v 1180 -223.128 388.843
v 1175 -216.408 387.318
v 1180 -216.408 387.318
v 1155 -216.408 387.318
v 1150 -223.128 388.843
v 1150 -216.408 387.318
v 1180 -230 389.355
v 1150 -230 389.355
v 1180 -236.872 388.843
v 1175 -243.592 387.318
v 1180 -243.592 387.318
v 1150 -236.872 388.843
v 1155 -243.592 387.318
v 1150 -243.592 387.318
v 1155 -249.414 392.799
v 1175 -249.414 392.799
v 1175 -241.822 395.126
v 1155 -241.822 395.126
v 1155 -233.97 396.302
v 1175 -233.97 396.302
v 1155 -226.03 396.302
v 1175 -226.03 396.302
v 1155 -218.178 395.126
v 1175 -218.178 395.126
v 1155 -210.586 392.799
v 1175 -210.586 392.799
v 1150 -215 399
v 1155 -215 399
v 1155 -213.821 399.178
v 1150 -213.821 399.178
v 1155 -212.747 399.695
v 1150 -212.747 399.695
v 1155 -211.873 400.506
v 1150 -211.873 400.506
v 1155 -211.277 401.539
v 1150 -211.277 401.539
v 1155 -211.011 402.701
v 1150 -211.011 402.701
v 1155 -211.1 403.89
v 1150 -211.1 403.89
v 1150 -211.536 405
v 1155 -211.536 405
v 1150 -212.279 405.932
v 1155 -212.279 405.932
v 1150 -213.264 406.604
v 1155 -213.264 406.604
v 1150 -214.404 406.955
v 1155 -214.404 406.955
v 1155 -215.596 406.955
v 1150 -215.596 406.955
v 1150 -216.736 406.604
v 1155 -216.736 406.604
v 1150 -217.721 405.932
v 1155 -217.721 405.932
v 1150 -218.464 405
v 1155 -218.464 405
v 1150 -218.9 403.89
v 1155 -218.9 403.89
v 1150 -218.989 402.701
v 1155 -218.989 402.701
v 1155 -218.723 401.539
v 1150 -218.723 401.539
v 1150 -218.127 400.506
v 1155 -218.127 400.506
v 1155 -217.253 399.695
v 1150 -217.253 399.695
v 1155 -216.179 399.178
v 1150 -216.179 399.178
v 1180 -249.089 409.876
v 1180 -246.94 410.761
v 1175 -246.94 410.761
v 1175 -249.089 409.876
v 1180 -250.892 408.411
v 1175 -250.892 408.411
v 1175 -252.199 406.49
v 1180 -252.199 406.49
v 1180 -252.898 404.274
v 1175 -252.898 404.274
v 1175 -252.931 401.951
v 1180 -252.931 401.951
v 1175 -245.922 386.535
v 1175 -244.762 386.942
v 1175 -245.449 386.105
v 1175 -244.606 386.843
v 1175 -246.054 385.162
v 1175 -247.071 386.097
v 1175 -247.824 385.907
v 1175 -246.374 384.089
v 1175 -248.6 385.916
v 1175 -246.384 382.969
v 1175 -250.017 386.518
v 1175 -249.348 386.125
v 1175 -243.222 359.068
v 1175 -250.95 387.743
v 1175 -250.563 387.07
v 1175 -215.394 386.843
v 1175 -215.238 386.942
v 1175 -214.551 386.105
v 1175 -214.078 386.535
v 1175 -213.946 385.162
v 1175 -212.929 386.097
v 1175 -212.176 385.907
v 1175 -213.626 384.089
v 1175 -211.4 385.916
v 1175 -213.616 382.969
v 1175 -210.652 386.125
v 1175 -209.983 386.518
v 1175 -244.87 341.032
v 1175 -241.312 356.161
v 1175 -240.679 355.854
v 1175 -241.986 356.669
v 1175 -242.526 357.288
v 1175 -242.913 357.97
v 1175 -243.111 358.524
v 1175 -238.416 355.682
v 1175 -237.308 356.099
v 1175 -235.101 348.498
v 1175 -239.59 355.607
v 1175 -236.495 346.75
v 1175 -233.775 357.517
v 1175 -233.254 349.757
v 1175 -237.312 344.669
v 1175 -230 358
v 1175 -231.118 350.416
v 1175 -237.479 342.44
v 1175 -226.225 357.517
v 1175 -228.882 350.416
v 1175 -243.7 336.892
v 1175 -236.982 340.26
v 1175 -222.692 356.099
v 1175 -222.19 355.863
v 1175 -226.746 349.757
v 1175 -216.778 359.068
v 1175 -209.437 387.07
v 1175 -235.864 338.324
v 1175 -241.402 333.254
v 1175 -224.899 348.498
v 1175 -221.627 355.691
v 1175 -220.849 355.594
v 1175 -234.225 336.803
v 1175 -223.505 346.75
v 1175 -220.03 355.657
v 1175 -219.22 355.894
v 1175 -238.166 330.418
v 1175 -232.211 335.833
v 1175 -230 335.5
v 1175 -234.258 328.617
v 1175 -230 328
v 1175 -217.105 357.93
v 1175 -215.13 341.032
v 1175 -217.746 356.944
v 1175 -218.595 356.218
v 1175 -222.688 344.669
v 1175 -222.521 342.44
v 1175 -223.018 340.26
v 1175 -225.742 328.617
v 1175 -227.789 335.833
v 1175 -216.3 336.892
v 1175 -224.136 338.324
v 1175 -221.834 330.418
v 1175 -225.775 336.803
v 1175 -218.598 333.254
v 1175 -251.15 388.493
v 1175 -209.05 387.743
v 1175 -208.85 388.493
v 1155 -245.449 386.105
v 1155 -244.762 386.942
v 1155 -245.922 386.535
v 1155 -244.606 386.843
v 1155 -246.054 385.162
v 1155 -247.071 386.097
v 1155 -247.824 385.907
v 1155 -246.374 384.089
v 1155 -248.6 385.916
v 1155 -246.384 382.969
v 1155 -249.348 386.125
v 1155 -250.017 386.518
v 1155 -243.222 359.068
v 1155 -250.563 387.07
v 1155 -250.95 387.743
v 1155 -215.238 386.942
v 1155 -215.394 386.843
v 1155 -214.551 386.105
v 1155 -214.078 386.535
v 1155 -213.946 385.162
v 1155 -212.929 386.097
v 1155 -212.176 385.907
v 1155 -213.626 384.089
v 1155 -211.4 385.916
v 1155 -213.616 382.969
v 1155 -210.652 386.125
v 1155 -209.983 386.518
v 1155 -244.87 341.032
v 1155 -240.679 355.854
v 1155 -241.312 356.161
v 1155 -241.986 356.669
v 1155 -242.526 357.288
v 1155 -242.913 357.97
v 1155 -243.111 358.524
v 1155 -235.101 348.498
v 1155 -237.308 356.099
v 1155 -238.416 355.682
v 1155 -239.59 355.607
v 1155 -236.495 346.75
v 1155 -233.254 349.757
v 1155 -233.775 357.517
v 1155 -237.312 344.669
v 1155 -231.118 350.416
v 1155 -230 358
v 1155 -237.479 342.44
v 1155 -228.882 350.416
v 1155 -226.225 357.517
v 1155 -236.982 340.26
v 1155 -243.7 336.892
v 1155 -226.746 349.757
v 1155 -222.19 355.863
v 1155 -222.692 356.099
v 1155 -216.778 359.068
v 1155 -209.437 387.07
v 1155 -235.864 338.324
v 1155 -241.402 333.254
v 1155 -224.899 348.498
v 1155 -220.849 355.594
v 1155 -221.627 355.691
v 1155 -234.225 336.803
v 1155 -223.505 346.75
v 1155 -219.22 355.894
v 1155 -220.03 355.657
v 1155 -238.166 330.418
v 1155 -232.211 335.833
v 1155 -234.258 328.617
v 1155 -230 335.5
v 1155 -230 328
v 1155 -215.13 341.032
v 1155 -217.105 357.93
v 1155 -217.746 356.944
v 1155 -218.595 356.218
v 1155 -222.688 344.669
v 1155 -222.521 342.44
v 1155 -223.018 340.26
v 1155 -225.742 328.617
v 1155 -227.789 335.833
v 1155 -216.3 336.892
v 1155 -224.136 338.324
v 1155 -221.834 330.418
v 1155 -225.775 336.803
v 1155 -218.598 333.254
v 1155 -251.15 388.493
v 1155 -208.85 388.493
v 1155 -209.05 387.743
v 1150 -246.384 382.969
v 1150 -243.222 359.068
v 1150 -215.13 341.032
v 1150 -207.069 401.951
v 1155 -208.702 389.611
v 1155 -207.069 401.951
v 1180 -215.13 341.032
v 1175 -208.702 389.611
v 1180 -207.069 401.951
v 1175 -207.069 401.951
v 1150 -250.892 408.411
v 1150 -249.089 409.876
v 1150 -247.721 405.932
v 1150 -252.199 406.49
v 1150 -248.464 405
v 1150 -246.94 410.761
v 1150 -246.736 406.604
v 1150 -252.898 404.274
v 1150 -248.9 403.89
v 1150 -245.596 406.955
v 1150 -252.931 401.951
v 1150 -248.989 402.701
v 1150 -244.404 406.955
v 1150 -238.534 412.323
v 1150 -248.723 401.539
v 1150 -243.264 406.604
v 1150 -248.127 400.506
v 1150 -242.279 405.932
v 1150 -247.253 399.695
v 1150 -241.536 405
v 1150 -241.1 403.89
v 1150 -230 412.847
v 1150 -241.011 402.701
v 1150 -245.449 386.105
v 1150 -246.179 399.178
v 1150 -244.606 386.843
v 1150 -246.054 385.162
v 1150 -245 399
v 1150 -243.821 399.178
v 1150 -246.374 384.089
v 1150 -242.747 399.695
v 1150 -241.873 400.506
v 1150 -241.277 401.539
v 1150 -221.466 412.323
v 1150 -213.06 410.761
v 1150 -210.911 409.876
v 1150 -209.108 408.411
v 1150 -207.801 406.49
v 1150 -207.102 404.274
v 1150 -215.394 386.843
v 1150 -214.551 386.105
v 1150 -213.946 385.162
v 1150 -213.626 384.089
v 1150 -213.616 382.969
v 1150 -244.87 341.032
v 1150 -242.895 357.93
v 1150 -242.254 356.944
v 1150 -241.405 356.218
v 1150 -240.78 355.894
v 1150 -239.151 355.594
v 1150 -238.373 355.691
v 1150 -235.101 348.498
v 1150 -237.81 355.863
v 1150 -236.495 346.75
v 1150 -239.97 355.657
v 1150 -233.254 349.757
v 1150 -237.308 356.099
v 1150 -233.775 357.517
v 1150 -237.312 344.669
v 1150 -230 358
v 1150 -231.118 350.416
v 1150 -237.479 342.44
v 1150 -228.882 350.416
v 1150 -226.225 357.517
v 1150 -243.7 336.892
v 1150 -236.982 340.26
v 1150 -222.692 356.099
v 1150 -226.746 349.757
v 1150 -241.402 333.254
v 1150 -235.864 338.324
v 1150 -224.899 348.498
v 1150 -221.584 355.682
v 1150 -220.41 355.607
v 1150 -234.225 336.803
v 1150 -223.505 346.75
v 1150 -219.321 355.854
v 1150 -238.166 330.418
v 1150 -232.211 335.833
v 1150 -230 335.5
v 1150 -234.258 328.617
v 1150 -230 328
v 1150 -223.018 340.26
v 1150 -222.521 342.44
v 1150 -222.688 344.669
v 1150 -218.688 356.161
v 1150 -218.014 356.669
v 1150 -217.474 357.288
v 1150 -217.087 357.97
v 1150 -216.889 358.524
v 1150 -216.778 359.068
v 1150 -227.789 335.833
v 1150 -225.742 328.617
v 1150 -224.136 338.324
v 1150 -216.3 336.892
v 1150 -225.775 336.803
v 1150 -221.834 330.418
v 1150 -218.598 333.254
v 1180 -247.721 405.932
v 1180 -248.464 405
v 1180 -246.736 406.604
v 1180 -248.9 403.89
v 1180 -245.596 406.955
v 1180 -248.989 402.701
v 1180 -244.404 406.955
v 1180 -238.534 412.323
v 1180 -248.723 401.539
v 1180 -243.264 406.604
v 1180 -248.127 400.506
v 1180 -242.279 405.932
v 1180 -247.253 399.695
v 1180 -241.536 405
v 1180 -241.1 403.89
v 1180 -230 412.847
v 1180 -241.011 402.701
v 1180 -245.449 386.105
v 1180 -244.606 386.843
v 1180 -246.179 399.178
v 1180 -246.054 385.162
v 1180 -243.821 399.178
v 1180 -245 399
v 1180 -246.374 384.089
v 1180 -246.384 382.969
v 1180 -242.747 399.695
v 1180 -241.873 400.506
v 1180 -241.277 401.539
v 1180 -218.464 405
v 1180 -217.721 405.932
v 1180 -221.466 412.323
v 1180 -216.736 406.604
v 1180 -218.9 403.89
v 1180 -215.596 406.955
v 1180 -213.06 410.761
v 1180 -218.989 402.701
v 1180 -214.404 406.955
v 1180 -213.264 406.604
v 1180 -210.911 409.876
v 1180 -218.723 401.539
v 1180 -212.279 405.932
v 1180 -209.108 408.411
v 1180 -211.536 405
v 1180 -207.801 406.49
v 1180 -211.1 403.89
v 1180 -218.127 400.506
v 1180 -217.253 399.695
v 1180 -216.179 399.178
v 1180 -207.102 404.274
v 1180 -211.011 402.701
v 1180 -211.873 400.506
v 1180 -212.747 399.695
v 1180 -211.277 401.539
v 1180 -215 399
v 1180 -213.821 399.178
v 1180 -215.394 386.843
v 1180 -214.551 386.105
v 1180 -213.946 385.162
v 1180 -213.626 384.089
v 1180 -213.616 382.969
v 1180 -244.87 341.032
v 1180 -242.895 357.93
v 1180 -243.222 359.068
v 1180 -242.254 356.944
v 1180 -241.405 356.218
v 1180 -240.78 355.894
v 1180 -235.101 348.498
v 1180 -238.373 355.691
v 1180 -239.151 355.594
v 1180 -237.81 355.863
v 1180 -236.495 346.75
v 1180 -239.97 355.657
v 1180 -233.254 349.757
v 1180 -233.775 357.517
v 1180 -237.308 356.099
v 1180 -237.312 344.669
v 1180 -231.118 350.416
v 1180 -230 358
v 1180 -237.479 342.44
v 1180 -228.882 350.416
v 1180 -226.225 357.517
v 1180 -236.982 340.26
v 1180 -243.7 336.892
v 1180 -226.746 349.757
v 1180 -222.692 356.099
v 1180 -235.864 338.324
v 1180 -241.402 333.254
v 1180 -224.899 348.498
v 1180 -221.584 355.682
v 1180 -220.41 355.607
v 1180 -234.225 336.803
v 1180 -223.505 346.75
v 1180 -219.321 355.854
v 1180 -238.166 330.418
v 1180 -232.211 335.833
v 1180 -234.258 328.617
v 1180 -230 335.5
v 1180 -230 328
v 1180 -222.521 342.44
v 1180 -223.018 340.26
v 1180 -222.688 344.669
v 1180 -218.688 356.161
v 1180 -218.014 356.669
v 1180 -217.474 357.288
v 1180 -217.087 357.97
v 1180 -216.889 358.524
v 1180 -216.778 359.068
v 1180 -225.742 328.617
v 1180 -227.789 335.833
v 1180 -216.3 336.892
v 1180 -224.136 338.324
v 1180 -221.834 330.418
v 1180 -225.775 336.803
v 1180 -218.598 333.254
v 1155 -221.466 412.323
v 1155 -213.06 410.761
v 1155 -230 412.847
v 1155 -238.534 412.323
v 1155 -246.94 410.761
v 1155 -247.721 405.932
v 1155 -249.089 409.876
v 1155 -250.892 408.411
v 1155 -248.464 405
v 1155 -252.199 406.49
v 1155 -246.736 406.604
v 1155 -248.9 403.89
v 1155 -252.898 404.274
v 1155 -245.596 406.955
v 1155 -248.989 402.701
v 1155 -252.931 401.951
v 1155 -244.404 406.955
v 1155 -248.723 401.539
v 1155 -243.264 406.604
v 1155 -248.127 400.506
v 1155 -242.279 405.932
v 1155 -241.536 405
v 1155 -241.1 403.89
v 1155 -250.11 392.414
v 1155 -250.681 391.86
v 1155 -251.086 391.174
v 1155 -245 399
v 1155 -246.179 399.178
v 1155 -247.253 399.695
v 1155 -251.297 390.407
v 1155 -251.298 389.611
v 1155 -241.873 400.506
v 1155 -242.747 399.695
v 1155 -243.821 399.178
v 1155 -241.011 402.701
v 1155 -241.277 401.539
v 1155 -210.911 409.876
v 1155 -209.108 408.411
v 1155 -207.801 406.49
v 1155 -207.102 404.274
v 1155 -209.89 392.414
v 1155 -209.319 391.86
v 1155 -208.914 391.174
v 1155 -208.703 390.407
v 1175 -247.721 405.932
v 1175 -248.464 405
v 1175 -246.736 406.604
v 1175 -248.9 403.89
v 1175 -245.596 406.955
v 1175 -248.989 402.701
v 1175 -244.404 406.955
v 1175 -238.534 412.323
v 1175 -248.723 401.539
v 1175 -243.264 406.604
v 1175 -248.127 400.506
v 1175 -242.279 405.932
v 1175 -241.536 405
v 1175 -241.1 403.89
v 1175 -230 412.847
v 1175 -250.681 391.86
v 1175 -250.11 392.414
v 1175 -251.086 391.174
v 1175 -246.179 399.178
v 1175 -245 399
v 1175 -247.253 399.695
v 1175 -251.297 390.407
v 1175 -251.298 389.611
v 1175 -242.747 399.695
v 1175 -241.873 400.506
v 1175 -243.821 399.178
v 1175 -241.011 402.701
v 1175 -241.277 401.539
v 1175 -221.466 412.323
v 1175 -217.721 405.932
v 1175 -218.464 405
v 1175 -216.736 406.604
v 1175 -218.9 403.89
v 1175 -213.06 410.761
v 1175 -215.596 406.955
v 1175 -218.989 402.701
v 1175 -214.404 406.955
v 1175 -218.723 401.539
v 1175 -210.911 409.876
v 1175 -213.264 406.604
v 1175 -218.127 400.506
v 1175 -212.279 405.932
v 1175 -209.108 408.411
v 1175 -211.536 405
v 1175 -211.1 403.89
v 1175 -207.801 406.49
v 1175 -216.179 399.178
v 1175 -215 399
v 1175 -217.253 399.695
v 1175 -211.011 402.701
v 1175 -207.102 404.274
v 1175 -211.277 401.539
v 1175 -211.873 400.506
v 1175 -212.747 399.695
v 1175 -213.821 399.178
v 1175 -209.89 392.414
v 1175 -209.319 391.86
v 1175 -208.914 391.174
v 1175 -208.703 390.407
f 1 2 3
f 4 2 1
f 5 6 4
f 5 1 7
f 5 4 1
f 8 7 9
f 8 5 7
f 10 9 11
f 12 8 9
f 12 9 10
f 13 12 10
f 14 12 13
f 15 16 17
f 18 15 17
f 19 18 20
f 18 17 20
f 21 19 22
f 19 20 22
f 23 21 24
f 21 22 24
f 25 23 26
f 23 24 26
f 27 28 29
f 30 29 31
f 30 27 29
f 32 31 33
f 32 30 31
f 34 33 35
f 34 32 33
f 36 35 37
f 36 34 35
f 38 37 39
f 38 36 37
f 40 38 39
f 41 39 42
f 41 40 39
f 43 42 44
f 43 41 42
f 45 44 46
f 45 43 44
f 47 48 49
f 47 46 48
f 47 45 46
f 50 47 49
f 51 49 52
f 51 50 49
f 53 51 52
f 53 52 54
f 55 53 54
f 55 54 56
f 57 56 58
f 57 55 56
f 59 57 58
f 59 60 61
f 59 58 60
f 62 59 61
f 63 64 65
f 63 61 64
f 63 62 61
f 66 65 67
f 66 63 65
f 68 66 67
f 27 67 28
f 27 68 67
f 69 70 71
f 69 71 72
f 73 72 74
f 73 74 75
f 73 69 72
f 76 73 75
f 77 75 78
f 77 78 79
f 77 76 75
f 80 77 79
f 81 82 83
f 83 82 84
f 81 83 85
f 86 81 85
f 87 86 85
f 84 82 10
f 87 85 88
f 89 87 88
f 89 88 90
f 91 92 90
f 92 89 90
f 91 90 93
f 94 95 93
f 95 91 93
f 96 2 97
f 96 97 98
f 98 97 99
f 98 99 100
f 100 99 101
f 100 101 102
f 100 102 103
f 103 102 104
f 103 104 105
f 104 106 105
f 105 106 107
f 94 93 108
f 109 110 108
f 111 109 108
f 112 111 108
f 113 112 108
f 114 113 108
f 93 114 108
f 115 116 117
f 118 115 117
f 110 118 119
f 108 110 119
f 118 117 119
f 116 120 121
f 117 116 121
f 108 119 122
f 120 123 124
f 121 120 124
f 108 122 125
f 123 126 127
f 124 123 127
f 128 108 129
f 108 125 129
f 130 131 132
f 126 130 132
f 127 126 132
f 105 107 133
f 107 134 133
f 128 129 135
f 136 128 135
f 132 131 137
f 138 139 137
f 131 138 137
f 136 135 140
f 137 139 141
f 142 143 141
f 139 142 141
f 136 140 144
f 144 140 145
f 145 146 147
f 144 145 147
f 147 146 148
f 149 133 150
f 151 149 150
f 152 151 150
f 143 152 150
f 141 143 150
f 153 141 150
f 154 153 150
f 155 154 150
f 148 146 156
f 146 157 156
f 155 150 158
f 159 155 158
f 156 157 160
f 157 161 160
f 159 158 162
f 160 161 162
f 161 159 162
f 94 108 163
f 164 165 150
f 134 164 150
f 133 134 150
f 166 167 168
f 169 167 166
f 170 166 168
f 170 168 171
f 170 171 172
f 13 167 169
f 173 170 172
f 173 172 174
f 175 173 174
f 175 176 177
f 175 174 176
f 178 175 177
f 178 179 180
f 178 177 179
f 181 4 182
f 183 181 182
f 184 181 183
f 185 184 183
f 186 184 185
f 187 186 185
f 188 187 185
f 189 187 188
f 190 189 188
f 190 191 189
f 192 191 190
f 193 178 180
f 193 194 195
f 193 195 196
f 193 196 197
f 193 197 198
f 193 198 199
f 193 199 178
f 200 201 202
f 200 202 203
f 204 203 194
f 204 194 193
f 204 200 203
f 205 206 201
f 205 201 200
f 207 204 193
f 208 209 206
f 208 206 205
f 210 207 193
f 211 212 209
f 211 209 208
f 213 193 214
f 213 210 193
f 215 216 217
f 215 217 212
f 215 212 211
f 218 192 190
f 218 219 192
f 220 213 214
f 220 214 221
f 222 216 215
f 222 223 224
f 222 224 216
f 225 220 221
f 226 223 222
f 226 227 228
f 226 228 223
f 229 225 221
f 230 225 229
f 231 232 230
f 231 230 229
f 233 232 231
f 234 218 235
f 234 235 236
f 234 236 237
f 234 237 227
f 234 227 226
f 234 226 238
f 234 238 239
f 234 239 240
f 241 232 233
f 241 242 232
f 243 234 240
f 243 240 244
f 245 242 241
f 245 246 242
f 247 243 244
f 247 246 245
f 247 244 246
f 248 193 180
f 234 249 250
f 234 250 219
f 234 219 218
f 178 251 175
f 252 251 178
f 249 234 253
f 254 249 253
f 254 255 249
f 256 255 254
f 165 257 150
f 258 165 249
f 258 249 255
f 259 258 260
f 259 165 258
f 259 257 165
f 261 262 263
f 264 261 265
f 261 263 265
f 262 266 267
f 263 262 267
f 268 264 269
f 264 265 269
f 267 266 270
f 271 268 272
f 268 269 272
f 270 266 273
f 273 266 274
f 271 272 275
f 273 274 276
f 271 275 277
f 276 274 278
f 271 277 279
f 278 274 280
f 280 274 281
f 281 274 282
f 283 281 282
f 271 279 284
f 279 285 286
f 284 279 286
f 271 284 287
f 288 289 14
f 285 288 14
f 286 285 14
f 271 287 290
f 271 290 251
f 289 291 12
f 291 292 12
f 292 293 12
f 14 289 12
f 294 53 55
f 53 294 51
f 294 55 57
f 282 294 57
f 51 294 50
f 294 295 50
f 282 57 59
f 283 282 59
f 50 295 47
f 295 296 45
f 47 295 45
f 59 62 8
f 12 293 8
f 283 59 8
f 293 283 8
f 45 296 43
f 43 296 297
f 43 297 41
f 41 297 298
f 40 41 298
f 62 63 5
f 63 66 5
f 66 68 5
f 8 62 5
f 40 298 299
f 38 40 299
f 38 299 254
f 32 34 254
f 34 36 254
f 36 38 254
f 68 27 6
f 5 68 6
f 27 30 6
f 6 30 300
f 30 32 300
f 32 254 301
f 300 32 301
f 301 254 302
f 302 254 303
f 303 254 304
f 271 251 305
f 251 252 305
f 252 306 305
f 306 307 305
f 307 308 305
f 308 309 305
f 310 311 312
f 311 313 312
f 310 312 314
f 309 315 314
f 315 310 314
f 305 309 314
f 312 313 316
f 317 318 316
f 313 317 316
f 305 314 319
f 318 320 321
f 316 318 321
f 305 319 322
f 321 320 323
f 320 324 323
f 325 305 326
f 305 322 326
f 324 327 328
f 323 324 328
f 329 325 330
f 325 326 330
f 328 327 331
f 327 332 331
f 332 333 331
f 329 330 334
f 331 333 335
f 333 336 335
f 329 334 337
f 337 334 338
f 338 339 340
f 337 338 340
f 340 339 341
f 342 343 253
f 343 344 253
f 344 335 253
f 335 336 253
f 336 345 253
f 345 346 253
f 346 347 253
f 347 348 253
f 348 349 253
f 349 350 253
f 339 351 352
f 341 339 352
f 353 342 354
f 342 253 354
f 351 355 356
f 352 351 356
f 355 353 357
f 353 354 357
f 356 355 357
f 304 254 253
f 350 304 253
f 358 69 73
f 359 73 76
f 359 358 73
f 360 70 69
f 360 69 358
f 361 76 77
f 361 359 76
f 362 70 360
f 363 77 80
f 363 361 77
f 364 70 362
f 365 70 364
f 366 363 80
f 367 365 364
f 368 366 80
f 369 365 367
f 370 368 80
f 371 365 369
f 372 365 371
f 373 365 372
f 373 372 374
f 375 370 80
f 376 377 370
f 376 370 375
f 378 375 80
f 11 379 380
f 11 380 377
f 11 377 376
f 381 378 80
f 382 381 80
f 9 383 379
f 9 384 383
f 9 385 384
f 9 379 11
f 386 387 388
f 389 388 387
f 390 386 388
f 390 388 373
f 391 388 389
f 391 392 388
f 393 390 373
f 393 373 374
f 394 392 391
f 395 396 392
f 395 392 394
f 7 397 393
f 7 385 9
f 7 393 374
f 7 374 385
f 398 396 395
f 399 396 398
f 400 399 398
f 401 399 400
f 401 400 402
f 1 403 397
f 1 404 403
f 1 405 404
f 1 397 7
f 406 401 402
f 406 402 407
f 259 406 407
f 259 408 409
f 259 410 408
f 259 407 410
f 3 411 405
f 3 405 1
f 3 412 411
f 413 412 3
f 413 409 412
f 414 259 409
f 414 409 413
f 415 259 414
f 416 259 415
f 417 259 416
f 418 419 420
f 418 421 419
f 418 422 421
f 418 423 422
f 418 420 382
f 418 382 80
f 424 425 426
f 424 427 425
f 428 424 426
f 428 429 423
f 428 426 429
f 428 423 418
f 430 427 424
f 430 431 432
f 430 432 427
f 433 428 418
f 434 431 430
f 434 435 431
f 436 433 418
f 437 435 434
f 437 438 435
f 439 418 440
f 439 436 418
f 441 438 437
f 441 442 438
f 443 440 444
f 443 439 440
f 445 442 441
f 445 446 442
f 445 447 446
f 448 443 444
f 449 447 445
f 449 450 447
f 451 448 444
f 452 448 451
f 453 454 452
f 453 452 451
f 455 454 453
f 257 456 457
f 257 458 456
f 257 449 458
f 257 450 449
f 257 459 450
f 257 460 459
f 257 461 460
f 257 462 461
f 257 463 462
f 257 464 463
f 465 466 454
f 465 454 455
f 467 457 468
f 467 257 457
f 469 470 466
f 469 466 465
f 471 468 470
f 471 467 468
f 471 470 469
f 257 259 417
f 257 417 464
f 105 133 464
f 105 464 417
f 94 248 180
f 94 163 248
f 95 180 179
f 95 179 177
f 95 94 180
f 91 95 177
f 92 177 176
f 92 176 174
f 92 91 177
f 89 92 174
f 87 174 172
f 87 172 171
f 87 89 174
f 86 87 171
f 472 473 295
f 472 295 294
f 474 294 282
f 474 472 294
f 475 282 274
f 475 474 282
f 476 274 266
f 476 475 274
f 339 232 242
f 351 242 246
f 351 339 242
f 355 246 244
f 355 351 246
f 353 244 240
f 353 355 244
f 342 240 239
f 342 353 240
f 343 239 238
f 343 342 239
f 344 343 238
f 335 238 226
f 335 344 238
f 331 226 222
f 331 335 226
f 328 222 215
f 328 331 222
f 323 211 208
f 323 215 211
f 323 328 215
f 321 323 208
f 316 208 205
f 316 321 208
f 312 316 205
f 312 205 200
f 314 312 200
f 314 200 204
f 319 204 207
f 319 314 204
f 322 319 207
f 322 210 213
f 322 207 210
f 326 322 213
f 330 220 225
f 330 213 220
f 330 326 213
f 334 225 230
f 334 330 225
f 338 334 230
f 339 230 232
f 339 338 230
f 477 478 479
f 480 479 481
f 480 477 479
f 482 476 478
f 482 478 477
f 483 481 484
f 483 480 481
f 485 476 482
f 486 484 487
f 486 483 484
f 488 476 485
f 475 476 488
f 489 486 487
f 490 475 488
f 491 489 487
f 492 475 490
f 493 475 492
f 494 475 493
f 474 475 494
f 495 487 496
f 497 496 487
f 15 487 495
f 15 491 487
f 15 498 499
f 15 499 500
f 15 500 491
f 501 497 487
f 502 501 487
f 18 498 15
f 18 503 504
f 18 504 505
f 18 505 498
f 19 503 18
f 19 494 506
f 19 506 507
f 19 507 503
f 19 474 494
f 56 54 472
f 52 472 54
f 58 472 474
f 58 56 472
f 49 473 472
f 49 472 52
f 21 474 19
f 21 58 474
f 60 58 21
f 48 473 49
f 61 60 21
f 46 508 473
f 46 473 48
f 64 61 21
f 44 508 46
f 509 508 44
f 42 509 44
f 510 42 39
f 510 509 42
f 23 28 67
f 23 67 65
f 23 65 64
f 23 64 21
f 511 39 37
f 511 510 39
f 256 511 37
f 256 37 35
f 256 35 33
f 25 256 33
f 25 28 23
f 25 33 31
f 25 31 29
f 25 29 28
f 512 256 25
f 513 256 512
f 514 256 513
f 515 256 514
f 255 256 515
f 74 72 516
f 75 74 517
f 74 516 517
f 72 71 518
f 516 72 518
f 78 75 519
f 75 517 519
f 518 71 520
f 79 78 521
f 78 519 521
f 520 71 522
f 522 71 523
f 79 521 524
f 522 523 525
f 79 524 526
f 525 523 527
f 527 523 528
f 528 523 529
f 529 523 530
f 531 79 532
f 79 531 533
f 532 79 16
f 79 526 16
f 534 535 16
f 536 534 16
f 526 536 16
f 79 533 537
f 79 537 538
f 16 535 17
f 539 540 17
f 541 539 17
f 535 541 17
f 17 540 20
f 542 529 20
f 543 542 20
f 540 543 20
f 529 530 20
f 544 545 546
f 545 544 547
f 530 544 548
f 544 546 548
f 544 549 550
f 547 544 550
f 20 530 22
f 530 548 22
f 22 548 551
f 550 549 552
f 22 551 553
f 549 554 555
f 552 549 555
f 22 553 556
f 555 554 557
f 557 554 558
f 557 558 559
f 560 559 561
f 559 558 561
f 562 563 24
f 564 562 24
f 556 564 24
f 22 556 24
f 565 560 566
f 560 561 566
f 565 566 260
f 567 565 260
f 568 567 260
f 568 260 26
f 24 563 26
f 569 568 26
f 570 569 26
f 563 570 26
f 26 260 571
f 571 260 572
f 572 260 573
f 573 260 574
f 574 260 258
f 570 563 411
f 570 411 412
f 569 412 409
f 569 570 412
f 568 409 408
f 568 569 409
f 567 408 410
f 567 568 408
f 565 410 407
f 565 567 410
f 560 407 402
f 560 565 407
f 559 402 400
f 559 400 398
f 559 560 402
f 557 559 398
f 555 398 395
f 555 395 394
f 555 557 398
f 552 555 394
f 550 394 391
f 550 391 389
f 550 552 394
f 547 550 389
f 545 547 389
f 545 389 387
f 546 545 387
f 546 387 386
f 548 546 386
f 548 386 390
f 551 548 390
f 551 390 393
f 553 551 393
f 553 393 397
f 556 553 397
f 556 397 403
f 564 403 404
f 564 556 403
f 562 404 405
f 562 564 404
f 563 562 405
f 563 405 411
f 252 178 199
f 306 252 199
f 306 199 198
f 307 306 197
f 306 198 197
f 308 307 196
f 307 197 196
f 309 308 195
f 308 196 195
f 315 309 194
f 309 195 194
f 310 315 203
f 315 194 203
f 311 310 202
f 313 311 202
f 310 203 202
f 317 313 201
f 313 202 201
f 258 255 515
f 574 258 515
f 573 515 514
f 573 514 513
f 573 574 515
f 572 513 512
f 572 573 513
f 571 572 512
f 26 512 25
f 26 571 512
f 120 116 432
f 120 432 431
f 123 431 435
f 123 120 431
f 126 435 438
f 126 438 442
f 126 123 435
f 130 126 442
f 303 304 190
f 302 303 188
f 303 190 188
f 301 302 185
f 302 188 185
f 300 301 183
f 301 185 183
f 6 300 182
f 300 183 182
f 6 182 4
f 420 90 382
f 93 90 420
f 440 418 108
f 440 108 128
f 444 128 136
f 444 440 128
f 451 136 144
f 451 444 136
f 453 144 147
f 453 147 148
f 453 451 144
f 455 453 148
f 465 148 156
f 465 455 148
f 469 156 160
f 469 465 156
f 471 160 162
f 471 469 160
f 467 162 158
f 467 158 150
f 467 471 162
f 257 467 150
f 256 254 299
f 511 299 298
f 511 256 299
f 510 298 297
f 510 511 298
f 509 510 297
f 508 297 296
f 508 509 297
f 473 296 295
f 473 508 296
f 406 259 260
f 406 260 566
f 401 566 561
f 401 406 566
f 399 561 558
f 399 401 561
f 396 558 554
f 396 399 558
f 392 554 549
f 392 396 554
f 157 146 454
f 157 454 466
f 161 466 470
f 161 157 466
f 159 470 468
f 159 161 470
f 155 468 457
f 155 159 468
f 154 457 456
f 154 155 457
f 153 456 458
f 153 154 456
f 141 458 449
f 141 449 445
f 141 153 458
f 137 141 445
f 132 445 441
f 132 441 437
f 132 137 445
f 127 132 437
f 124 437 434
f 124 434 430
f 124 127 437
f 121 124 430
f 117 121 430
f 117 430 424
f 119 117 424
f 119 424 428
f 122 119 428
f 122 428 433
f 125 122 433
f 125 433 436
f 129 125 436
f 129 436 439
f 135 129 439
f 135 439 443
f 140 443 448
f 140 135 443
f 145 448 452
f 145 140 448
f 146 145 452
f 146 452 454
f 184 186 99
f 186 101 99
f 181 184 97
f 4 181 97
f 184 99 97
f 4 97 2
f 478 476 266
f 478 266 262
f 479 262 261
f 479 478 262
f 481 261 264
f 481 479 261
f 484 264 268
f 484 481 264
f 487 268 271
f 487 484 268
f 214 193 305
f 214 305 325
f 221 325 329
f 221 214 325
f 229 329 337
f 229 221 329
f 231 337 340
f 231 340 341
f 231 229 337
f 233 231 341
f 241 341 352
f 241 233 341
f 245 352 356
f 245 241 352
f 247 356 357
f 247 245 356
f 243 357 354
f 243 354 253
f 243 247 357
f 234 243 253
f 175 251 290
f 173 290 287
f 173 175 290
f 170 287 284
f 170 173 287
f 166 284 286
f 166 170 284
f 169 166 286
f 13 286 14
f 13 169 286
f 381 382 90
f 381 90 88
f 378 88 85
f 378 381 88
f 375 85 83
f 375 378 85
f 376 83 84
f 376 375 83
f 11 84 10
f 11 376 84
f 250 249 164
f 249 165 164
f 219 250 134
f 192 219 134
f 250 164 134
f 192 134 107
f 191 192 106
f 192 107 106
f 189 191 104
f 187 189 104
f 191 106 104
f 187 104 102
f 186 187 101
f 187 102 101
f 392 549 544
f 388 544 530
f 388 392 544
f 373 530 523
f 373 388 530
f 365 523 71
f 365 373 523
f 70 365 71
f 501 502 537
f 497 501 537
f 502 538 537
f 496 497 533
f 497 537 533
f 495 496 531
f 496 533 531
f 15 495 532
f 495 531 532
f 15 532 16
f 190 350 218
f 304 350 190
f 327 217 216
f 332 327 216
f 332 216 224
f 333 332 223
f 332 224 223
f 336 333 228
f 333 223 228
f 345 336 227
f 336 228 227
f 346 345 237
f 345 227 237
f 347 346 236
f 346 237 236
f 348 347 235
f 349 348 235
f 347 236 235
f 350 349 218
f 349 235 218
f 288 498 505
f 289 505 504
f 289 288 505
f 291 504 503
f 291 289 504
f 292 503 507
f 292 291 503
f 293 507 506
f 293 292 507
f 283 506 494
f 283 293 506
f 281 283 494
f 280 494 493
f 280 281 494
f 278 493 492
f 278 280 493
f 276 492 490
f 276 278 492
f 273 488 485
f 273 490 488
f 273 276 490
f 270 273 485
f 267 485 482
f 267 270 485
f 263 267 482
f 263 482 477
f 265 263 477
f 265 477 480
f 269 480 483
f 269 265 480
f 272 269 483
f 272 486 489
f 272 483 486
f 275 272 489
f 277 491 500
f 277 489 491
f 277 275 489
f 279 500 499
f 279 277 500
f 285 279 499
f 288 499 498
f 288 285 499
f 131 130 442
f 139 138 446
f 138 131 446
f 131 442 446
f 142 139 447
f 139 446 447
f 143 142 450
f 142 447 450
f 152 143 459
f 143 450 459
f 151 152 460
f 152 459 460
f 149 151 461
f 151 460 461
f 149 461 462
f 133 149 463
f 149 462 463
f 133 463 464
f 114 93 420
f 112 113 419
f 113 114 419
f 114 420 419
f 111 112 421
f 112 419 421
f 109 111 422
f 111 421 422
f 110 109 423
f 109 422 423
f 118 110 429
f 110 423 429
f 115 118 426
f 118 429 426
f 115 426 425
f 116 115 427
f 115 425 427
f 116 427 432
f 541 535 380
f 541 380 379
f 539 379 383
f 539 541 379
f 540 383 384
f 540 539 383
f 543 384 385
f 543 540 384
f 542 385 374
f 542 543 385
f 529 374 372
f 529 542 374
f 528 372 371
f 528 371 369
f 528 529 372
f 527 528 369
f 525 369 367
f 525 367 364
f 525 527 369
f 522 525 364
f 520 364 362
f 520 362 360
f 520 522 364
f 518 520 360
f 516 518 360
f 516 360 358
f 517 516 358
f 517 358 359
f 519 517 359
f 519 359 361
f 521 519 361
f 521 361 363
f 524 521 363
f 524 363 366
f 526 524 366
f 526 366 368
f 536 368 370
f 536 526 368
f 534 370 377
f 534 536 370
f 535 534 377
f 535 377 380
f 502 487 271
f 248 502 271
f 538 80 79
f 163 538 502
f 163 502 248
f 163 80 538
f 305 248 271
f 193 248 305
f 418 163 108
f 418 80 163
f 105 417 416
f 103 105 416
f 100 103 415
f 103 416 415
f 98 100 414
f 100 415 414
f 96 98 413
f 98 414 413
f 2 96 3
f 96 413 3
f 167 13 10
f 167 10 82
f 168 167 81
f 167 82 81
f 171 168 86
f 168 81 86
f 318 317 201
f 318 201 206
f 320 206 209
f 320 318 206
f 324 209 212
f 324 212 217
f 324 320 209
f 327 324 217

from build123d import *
from build123d.topology import SkipClean

# Parameters (mm, degrees)
SKETCH1_R           = 7.5
SKETCH1_R_2         = 4
BOSS_EXTRUDE2_DEPTH = 15
CUT_EXTRUDE3_DEPTH  = 486.130191019
FILLET1_R           = 4
CUT_EXTRUDE8_DEPTH  = 10
SKETCH16_R          = 46.355085109
CUT_EXTRUDE9_DEPTH  = 10
FILLET6_R           = 3
FILLET7_R           = 3


with BuildPart() as part:
    # Sketch1 → Boss-Extrude2 (new, symmetric)
    with BuildSketch(Plane(origin=(1165, 0, 0), x_dir=(0, 0, -1), z_dir=(1, 0, 0))):
        with BuildLine():
            Line((-401.950614401, -252.930875731), (-341.032402001, -244.870391996))
            ThreePointArc((-341.032402001, -244.870391996), (-328, -230), (-341.032402001, -215.129608004))
            Line((-341.032402001, -215.129608004), (-401.950614401, -207.069124269))
            ThreePointArc((-401.950614401, -207.069124269), (-407.498189204, -208.384390135), (-410.761140001, -213.059715))
            ThreePointArc((-410.761140001, -213.059715), (-412.846584384, -230), (-410.761140001, -246.940285))
            ThreePointArc((-410.761140001, -246.940285), (-407.498189204, -251.615609865), (-401.950614401, -252.930875731))
        make_face()
        with Locations((-343, -230)):
            Circle(SKETCH1_R, mode=Mode.SUBTRACT)
        with Locations((-403, -215)):
            Circle(SKETCH1_R_2, mode=Mode.SUBTRACT)
        with Locations((-403, -245)):
            Circle(SKETCH1_R_2, mode=Mode.SUBTRACT)
    extrude(amount=BOSS_EXTRUDE2_DEPTH, both=True)

    # Sketch3 → Cut-Extrude3 (cut, through all)
    with BuildSketch(Plane.ZY.offset(-1150)):
        with BuildLine():
            Line((386.199035454, -246.8118188), (356.915169615, -242.937080606))
            Line((356.915169615, -242.937080606), (351.667017329, -242.242663543))
            ThreePointArc((351.667017329, -242.242663543), (358, -230), (351.667017329, -217.757336457))
            Line((351.667017329, -217.757336457), (356.915169615, -217.062919394))
            Line((356.915169615, -217.062919394), (386.199035454, -213.1881812))
            ThreePointArc((386.199035454, -213.1881812), (389.355085109, -230), (386.199035454, -246.8118188))
        make_face()
    extrude(amount=-CUT_EXTRUDE3_DEPTH, mode=Mode.SUBTRACT)

    # Fillet1
    fillet1_edges = [part.edges().sort_by_distance(p)[0] for p in [
        (1165, -246.8118188, 386.199035454),
        (1165, -242.242663543, 351.667017329),
        (1165, -217.757336457, 351.667017329),
        (1165, -213.1881812, 386.199035454),
    ]]
    fillet(fillet1_edges, radius=FILLET1_R)

    # Sketch14 → Cut-Extrude8 (cut, symmetric)
    with BuildSketch(Plane(origin=(1165, 0, 0), x_dir=(0, 0, -1), z_dir=(1, 0, 0))):
        with BuildLine():
            Line((-374.476194015, -186.80167911), (-394.628690595, -182.957214607))
            ThreePointArc((-394.628690595, -182.957214607), (-412.839050853, -231.025829466), (-393.224741594, -278.538857444))
            Line((-393.224741594, -278.538857444), (-380.9384348, -267.649978517))
            ThreePointArc((-380.9384348, -267.649978517), (-396.279541596, -225.741342376), (-374.476194015, -186.80167911))
        make_face()
    extrude(amount=CUT_EXTRUDE8_DEPTH, both=True, mode=Mode.SUBTRACT)

    # Sketch16 → Cut-Extrude9 (cut, symmetric)
    with SkipClean():  # the faces are left unmerged after this step: merging them gives an invalid solid
        with BuildSketch(Plane(origin=(1165, 0, 0), x_dir=(0, 0, -1), z_dir=(1, 0, 0))):
            with Locations((-343, -230)):
                Circle(SKETCH16_R)
        extrude(amount=CUT_EXTRUDE9_DEPTH, both=True, mode=Mode.SUBTRACT)

    # Fillet6
    fillet6_edges = [part.edges().sort_by_distance(p)[0] for p in [
        (1165, -208.400223767, 391.890647205),
        (1165, -251.599776233, 391.890647205),
    ]]
    fillet(fillet6_edges, radius=FILLET6_R)

    # Fillet7
    fillet7_edges = [part.edges().sort_by_distance(p)[0] for p in [
        (1165, -250.623789579, 384.514494082),
        (1165, -209.376210421, 384.514494082),
    ]]
    fillet(fillet7_edges, radius=FILLET7_R)


solid = part.part
